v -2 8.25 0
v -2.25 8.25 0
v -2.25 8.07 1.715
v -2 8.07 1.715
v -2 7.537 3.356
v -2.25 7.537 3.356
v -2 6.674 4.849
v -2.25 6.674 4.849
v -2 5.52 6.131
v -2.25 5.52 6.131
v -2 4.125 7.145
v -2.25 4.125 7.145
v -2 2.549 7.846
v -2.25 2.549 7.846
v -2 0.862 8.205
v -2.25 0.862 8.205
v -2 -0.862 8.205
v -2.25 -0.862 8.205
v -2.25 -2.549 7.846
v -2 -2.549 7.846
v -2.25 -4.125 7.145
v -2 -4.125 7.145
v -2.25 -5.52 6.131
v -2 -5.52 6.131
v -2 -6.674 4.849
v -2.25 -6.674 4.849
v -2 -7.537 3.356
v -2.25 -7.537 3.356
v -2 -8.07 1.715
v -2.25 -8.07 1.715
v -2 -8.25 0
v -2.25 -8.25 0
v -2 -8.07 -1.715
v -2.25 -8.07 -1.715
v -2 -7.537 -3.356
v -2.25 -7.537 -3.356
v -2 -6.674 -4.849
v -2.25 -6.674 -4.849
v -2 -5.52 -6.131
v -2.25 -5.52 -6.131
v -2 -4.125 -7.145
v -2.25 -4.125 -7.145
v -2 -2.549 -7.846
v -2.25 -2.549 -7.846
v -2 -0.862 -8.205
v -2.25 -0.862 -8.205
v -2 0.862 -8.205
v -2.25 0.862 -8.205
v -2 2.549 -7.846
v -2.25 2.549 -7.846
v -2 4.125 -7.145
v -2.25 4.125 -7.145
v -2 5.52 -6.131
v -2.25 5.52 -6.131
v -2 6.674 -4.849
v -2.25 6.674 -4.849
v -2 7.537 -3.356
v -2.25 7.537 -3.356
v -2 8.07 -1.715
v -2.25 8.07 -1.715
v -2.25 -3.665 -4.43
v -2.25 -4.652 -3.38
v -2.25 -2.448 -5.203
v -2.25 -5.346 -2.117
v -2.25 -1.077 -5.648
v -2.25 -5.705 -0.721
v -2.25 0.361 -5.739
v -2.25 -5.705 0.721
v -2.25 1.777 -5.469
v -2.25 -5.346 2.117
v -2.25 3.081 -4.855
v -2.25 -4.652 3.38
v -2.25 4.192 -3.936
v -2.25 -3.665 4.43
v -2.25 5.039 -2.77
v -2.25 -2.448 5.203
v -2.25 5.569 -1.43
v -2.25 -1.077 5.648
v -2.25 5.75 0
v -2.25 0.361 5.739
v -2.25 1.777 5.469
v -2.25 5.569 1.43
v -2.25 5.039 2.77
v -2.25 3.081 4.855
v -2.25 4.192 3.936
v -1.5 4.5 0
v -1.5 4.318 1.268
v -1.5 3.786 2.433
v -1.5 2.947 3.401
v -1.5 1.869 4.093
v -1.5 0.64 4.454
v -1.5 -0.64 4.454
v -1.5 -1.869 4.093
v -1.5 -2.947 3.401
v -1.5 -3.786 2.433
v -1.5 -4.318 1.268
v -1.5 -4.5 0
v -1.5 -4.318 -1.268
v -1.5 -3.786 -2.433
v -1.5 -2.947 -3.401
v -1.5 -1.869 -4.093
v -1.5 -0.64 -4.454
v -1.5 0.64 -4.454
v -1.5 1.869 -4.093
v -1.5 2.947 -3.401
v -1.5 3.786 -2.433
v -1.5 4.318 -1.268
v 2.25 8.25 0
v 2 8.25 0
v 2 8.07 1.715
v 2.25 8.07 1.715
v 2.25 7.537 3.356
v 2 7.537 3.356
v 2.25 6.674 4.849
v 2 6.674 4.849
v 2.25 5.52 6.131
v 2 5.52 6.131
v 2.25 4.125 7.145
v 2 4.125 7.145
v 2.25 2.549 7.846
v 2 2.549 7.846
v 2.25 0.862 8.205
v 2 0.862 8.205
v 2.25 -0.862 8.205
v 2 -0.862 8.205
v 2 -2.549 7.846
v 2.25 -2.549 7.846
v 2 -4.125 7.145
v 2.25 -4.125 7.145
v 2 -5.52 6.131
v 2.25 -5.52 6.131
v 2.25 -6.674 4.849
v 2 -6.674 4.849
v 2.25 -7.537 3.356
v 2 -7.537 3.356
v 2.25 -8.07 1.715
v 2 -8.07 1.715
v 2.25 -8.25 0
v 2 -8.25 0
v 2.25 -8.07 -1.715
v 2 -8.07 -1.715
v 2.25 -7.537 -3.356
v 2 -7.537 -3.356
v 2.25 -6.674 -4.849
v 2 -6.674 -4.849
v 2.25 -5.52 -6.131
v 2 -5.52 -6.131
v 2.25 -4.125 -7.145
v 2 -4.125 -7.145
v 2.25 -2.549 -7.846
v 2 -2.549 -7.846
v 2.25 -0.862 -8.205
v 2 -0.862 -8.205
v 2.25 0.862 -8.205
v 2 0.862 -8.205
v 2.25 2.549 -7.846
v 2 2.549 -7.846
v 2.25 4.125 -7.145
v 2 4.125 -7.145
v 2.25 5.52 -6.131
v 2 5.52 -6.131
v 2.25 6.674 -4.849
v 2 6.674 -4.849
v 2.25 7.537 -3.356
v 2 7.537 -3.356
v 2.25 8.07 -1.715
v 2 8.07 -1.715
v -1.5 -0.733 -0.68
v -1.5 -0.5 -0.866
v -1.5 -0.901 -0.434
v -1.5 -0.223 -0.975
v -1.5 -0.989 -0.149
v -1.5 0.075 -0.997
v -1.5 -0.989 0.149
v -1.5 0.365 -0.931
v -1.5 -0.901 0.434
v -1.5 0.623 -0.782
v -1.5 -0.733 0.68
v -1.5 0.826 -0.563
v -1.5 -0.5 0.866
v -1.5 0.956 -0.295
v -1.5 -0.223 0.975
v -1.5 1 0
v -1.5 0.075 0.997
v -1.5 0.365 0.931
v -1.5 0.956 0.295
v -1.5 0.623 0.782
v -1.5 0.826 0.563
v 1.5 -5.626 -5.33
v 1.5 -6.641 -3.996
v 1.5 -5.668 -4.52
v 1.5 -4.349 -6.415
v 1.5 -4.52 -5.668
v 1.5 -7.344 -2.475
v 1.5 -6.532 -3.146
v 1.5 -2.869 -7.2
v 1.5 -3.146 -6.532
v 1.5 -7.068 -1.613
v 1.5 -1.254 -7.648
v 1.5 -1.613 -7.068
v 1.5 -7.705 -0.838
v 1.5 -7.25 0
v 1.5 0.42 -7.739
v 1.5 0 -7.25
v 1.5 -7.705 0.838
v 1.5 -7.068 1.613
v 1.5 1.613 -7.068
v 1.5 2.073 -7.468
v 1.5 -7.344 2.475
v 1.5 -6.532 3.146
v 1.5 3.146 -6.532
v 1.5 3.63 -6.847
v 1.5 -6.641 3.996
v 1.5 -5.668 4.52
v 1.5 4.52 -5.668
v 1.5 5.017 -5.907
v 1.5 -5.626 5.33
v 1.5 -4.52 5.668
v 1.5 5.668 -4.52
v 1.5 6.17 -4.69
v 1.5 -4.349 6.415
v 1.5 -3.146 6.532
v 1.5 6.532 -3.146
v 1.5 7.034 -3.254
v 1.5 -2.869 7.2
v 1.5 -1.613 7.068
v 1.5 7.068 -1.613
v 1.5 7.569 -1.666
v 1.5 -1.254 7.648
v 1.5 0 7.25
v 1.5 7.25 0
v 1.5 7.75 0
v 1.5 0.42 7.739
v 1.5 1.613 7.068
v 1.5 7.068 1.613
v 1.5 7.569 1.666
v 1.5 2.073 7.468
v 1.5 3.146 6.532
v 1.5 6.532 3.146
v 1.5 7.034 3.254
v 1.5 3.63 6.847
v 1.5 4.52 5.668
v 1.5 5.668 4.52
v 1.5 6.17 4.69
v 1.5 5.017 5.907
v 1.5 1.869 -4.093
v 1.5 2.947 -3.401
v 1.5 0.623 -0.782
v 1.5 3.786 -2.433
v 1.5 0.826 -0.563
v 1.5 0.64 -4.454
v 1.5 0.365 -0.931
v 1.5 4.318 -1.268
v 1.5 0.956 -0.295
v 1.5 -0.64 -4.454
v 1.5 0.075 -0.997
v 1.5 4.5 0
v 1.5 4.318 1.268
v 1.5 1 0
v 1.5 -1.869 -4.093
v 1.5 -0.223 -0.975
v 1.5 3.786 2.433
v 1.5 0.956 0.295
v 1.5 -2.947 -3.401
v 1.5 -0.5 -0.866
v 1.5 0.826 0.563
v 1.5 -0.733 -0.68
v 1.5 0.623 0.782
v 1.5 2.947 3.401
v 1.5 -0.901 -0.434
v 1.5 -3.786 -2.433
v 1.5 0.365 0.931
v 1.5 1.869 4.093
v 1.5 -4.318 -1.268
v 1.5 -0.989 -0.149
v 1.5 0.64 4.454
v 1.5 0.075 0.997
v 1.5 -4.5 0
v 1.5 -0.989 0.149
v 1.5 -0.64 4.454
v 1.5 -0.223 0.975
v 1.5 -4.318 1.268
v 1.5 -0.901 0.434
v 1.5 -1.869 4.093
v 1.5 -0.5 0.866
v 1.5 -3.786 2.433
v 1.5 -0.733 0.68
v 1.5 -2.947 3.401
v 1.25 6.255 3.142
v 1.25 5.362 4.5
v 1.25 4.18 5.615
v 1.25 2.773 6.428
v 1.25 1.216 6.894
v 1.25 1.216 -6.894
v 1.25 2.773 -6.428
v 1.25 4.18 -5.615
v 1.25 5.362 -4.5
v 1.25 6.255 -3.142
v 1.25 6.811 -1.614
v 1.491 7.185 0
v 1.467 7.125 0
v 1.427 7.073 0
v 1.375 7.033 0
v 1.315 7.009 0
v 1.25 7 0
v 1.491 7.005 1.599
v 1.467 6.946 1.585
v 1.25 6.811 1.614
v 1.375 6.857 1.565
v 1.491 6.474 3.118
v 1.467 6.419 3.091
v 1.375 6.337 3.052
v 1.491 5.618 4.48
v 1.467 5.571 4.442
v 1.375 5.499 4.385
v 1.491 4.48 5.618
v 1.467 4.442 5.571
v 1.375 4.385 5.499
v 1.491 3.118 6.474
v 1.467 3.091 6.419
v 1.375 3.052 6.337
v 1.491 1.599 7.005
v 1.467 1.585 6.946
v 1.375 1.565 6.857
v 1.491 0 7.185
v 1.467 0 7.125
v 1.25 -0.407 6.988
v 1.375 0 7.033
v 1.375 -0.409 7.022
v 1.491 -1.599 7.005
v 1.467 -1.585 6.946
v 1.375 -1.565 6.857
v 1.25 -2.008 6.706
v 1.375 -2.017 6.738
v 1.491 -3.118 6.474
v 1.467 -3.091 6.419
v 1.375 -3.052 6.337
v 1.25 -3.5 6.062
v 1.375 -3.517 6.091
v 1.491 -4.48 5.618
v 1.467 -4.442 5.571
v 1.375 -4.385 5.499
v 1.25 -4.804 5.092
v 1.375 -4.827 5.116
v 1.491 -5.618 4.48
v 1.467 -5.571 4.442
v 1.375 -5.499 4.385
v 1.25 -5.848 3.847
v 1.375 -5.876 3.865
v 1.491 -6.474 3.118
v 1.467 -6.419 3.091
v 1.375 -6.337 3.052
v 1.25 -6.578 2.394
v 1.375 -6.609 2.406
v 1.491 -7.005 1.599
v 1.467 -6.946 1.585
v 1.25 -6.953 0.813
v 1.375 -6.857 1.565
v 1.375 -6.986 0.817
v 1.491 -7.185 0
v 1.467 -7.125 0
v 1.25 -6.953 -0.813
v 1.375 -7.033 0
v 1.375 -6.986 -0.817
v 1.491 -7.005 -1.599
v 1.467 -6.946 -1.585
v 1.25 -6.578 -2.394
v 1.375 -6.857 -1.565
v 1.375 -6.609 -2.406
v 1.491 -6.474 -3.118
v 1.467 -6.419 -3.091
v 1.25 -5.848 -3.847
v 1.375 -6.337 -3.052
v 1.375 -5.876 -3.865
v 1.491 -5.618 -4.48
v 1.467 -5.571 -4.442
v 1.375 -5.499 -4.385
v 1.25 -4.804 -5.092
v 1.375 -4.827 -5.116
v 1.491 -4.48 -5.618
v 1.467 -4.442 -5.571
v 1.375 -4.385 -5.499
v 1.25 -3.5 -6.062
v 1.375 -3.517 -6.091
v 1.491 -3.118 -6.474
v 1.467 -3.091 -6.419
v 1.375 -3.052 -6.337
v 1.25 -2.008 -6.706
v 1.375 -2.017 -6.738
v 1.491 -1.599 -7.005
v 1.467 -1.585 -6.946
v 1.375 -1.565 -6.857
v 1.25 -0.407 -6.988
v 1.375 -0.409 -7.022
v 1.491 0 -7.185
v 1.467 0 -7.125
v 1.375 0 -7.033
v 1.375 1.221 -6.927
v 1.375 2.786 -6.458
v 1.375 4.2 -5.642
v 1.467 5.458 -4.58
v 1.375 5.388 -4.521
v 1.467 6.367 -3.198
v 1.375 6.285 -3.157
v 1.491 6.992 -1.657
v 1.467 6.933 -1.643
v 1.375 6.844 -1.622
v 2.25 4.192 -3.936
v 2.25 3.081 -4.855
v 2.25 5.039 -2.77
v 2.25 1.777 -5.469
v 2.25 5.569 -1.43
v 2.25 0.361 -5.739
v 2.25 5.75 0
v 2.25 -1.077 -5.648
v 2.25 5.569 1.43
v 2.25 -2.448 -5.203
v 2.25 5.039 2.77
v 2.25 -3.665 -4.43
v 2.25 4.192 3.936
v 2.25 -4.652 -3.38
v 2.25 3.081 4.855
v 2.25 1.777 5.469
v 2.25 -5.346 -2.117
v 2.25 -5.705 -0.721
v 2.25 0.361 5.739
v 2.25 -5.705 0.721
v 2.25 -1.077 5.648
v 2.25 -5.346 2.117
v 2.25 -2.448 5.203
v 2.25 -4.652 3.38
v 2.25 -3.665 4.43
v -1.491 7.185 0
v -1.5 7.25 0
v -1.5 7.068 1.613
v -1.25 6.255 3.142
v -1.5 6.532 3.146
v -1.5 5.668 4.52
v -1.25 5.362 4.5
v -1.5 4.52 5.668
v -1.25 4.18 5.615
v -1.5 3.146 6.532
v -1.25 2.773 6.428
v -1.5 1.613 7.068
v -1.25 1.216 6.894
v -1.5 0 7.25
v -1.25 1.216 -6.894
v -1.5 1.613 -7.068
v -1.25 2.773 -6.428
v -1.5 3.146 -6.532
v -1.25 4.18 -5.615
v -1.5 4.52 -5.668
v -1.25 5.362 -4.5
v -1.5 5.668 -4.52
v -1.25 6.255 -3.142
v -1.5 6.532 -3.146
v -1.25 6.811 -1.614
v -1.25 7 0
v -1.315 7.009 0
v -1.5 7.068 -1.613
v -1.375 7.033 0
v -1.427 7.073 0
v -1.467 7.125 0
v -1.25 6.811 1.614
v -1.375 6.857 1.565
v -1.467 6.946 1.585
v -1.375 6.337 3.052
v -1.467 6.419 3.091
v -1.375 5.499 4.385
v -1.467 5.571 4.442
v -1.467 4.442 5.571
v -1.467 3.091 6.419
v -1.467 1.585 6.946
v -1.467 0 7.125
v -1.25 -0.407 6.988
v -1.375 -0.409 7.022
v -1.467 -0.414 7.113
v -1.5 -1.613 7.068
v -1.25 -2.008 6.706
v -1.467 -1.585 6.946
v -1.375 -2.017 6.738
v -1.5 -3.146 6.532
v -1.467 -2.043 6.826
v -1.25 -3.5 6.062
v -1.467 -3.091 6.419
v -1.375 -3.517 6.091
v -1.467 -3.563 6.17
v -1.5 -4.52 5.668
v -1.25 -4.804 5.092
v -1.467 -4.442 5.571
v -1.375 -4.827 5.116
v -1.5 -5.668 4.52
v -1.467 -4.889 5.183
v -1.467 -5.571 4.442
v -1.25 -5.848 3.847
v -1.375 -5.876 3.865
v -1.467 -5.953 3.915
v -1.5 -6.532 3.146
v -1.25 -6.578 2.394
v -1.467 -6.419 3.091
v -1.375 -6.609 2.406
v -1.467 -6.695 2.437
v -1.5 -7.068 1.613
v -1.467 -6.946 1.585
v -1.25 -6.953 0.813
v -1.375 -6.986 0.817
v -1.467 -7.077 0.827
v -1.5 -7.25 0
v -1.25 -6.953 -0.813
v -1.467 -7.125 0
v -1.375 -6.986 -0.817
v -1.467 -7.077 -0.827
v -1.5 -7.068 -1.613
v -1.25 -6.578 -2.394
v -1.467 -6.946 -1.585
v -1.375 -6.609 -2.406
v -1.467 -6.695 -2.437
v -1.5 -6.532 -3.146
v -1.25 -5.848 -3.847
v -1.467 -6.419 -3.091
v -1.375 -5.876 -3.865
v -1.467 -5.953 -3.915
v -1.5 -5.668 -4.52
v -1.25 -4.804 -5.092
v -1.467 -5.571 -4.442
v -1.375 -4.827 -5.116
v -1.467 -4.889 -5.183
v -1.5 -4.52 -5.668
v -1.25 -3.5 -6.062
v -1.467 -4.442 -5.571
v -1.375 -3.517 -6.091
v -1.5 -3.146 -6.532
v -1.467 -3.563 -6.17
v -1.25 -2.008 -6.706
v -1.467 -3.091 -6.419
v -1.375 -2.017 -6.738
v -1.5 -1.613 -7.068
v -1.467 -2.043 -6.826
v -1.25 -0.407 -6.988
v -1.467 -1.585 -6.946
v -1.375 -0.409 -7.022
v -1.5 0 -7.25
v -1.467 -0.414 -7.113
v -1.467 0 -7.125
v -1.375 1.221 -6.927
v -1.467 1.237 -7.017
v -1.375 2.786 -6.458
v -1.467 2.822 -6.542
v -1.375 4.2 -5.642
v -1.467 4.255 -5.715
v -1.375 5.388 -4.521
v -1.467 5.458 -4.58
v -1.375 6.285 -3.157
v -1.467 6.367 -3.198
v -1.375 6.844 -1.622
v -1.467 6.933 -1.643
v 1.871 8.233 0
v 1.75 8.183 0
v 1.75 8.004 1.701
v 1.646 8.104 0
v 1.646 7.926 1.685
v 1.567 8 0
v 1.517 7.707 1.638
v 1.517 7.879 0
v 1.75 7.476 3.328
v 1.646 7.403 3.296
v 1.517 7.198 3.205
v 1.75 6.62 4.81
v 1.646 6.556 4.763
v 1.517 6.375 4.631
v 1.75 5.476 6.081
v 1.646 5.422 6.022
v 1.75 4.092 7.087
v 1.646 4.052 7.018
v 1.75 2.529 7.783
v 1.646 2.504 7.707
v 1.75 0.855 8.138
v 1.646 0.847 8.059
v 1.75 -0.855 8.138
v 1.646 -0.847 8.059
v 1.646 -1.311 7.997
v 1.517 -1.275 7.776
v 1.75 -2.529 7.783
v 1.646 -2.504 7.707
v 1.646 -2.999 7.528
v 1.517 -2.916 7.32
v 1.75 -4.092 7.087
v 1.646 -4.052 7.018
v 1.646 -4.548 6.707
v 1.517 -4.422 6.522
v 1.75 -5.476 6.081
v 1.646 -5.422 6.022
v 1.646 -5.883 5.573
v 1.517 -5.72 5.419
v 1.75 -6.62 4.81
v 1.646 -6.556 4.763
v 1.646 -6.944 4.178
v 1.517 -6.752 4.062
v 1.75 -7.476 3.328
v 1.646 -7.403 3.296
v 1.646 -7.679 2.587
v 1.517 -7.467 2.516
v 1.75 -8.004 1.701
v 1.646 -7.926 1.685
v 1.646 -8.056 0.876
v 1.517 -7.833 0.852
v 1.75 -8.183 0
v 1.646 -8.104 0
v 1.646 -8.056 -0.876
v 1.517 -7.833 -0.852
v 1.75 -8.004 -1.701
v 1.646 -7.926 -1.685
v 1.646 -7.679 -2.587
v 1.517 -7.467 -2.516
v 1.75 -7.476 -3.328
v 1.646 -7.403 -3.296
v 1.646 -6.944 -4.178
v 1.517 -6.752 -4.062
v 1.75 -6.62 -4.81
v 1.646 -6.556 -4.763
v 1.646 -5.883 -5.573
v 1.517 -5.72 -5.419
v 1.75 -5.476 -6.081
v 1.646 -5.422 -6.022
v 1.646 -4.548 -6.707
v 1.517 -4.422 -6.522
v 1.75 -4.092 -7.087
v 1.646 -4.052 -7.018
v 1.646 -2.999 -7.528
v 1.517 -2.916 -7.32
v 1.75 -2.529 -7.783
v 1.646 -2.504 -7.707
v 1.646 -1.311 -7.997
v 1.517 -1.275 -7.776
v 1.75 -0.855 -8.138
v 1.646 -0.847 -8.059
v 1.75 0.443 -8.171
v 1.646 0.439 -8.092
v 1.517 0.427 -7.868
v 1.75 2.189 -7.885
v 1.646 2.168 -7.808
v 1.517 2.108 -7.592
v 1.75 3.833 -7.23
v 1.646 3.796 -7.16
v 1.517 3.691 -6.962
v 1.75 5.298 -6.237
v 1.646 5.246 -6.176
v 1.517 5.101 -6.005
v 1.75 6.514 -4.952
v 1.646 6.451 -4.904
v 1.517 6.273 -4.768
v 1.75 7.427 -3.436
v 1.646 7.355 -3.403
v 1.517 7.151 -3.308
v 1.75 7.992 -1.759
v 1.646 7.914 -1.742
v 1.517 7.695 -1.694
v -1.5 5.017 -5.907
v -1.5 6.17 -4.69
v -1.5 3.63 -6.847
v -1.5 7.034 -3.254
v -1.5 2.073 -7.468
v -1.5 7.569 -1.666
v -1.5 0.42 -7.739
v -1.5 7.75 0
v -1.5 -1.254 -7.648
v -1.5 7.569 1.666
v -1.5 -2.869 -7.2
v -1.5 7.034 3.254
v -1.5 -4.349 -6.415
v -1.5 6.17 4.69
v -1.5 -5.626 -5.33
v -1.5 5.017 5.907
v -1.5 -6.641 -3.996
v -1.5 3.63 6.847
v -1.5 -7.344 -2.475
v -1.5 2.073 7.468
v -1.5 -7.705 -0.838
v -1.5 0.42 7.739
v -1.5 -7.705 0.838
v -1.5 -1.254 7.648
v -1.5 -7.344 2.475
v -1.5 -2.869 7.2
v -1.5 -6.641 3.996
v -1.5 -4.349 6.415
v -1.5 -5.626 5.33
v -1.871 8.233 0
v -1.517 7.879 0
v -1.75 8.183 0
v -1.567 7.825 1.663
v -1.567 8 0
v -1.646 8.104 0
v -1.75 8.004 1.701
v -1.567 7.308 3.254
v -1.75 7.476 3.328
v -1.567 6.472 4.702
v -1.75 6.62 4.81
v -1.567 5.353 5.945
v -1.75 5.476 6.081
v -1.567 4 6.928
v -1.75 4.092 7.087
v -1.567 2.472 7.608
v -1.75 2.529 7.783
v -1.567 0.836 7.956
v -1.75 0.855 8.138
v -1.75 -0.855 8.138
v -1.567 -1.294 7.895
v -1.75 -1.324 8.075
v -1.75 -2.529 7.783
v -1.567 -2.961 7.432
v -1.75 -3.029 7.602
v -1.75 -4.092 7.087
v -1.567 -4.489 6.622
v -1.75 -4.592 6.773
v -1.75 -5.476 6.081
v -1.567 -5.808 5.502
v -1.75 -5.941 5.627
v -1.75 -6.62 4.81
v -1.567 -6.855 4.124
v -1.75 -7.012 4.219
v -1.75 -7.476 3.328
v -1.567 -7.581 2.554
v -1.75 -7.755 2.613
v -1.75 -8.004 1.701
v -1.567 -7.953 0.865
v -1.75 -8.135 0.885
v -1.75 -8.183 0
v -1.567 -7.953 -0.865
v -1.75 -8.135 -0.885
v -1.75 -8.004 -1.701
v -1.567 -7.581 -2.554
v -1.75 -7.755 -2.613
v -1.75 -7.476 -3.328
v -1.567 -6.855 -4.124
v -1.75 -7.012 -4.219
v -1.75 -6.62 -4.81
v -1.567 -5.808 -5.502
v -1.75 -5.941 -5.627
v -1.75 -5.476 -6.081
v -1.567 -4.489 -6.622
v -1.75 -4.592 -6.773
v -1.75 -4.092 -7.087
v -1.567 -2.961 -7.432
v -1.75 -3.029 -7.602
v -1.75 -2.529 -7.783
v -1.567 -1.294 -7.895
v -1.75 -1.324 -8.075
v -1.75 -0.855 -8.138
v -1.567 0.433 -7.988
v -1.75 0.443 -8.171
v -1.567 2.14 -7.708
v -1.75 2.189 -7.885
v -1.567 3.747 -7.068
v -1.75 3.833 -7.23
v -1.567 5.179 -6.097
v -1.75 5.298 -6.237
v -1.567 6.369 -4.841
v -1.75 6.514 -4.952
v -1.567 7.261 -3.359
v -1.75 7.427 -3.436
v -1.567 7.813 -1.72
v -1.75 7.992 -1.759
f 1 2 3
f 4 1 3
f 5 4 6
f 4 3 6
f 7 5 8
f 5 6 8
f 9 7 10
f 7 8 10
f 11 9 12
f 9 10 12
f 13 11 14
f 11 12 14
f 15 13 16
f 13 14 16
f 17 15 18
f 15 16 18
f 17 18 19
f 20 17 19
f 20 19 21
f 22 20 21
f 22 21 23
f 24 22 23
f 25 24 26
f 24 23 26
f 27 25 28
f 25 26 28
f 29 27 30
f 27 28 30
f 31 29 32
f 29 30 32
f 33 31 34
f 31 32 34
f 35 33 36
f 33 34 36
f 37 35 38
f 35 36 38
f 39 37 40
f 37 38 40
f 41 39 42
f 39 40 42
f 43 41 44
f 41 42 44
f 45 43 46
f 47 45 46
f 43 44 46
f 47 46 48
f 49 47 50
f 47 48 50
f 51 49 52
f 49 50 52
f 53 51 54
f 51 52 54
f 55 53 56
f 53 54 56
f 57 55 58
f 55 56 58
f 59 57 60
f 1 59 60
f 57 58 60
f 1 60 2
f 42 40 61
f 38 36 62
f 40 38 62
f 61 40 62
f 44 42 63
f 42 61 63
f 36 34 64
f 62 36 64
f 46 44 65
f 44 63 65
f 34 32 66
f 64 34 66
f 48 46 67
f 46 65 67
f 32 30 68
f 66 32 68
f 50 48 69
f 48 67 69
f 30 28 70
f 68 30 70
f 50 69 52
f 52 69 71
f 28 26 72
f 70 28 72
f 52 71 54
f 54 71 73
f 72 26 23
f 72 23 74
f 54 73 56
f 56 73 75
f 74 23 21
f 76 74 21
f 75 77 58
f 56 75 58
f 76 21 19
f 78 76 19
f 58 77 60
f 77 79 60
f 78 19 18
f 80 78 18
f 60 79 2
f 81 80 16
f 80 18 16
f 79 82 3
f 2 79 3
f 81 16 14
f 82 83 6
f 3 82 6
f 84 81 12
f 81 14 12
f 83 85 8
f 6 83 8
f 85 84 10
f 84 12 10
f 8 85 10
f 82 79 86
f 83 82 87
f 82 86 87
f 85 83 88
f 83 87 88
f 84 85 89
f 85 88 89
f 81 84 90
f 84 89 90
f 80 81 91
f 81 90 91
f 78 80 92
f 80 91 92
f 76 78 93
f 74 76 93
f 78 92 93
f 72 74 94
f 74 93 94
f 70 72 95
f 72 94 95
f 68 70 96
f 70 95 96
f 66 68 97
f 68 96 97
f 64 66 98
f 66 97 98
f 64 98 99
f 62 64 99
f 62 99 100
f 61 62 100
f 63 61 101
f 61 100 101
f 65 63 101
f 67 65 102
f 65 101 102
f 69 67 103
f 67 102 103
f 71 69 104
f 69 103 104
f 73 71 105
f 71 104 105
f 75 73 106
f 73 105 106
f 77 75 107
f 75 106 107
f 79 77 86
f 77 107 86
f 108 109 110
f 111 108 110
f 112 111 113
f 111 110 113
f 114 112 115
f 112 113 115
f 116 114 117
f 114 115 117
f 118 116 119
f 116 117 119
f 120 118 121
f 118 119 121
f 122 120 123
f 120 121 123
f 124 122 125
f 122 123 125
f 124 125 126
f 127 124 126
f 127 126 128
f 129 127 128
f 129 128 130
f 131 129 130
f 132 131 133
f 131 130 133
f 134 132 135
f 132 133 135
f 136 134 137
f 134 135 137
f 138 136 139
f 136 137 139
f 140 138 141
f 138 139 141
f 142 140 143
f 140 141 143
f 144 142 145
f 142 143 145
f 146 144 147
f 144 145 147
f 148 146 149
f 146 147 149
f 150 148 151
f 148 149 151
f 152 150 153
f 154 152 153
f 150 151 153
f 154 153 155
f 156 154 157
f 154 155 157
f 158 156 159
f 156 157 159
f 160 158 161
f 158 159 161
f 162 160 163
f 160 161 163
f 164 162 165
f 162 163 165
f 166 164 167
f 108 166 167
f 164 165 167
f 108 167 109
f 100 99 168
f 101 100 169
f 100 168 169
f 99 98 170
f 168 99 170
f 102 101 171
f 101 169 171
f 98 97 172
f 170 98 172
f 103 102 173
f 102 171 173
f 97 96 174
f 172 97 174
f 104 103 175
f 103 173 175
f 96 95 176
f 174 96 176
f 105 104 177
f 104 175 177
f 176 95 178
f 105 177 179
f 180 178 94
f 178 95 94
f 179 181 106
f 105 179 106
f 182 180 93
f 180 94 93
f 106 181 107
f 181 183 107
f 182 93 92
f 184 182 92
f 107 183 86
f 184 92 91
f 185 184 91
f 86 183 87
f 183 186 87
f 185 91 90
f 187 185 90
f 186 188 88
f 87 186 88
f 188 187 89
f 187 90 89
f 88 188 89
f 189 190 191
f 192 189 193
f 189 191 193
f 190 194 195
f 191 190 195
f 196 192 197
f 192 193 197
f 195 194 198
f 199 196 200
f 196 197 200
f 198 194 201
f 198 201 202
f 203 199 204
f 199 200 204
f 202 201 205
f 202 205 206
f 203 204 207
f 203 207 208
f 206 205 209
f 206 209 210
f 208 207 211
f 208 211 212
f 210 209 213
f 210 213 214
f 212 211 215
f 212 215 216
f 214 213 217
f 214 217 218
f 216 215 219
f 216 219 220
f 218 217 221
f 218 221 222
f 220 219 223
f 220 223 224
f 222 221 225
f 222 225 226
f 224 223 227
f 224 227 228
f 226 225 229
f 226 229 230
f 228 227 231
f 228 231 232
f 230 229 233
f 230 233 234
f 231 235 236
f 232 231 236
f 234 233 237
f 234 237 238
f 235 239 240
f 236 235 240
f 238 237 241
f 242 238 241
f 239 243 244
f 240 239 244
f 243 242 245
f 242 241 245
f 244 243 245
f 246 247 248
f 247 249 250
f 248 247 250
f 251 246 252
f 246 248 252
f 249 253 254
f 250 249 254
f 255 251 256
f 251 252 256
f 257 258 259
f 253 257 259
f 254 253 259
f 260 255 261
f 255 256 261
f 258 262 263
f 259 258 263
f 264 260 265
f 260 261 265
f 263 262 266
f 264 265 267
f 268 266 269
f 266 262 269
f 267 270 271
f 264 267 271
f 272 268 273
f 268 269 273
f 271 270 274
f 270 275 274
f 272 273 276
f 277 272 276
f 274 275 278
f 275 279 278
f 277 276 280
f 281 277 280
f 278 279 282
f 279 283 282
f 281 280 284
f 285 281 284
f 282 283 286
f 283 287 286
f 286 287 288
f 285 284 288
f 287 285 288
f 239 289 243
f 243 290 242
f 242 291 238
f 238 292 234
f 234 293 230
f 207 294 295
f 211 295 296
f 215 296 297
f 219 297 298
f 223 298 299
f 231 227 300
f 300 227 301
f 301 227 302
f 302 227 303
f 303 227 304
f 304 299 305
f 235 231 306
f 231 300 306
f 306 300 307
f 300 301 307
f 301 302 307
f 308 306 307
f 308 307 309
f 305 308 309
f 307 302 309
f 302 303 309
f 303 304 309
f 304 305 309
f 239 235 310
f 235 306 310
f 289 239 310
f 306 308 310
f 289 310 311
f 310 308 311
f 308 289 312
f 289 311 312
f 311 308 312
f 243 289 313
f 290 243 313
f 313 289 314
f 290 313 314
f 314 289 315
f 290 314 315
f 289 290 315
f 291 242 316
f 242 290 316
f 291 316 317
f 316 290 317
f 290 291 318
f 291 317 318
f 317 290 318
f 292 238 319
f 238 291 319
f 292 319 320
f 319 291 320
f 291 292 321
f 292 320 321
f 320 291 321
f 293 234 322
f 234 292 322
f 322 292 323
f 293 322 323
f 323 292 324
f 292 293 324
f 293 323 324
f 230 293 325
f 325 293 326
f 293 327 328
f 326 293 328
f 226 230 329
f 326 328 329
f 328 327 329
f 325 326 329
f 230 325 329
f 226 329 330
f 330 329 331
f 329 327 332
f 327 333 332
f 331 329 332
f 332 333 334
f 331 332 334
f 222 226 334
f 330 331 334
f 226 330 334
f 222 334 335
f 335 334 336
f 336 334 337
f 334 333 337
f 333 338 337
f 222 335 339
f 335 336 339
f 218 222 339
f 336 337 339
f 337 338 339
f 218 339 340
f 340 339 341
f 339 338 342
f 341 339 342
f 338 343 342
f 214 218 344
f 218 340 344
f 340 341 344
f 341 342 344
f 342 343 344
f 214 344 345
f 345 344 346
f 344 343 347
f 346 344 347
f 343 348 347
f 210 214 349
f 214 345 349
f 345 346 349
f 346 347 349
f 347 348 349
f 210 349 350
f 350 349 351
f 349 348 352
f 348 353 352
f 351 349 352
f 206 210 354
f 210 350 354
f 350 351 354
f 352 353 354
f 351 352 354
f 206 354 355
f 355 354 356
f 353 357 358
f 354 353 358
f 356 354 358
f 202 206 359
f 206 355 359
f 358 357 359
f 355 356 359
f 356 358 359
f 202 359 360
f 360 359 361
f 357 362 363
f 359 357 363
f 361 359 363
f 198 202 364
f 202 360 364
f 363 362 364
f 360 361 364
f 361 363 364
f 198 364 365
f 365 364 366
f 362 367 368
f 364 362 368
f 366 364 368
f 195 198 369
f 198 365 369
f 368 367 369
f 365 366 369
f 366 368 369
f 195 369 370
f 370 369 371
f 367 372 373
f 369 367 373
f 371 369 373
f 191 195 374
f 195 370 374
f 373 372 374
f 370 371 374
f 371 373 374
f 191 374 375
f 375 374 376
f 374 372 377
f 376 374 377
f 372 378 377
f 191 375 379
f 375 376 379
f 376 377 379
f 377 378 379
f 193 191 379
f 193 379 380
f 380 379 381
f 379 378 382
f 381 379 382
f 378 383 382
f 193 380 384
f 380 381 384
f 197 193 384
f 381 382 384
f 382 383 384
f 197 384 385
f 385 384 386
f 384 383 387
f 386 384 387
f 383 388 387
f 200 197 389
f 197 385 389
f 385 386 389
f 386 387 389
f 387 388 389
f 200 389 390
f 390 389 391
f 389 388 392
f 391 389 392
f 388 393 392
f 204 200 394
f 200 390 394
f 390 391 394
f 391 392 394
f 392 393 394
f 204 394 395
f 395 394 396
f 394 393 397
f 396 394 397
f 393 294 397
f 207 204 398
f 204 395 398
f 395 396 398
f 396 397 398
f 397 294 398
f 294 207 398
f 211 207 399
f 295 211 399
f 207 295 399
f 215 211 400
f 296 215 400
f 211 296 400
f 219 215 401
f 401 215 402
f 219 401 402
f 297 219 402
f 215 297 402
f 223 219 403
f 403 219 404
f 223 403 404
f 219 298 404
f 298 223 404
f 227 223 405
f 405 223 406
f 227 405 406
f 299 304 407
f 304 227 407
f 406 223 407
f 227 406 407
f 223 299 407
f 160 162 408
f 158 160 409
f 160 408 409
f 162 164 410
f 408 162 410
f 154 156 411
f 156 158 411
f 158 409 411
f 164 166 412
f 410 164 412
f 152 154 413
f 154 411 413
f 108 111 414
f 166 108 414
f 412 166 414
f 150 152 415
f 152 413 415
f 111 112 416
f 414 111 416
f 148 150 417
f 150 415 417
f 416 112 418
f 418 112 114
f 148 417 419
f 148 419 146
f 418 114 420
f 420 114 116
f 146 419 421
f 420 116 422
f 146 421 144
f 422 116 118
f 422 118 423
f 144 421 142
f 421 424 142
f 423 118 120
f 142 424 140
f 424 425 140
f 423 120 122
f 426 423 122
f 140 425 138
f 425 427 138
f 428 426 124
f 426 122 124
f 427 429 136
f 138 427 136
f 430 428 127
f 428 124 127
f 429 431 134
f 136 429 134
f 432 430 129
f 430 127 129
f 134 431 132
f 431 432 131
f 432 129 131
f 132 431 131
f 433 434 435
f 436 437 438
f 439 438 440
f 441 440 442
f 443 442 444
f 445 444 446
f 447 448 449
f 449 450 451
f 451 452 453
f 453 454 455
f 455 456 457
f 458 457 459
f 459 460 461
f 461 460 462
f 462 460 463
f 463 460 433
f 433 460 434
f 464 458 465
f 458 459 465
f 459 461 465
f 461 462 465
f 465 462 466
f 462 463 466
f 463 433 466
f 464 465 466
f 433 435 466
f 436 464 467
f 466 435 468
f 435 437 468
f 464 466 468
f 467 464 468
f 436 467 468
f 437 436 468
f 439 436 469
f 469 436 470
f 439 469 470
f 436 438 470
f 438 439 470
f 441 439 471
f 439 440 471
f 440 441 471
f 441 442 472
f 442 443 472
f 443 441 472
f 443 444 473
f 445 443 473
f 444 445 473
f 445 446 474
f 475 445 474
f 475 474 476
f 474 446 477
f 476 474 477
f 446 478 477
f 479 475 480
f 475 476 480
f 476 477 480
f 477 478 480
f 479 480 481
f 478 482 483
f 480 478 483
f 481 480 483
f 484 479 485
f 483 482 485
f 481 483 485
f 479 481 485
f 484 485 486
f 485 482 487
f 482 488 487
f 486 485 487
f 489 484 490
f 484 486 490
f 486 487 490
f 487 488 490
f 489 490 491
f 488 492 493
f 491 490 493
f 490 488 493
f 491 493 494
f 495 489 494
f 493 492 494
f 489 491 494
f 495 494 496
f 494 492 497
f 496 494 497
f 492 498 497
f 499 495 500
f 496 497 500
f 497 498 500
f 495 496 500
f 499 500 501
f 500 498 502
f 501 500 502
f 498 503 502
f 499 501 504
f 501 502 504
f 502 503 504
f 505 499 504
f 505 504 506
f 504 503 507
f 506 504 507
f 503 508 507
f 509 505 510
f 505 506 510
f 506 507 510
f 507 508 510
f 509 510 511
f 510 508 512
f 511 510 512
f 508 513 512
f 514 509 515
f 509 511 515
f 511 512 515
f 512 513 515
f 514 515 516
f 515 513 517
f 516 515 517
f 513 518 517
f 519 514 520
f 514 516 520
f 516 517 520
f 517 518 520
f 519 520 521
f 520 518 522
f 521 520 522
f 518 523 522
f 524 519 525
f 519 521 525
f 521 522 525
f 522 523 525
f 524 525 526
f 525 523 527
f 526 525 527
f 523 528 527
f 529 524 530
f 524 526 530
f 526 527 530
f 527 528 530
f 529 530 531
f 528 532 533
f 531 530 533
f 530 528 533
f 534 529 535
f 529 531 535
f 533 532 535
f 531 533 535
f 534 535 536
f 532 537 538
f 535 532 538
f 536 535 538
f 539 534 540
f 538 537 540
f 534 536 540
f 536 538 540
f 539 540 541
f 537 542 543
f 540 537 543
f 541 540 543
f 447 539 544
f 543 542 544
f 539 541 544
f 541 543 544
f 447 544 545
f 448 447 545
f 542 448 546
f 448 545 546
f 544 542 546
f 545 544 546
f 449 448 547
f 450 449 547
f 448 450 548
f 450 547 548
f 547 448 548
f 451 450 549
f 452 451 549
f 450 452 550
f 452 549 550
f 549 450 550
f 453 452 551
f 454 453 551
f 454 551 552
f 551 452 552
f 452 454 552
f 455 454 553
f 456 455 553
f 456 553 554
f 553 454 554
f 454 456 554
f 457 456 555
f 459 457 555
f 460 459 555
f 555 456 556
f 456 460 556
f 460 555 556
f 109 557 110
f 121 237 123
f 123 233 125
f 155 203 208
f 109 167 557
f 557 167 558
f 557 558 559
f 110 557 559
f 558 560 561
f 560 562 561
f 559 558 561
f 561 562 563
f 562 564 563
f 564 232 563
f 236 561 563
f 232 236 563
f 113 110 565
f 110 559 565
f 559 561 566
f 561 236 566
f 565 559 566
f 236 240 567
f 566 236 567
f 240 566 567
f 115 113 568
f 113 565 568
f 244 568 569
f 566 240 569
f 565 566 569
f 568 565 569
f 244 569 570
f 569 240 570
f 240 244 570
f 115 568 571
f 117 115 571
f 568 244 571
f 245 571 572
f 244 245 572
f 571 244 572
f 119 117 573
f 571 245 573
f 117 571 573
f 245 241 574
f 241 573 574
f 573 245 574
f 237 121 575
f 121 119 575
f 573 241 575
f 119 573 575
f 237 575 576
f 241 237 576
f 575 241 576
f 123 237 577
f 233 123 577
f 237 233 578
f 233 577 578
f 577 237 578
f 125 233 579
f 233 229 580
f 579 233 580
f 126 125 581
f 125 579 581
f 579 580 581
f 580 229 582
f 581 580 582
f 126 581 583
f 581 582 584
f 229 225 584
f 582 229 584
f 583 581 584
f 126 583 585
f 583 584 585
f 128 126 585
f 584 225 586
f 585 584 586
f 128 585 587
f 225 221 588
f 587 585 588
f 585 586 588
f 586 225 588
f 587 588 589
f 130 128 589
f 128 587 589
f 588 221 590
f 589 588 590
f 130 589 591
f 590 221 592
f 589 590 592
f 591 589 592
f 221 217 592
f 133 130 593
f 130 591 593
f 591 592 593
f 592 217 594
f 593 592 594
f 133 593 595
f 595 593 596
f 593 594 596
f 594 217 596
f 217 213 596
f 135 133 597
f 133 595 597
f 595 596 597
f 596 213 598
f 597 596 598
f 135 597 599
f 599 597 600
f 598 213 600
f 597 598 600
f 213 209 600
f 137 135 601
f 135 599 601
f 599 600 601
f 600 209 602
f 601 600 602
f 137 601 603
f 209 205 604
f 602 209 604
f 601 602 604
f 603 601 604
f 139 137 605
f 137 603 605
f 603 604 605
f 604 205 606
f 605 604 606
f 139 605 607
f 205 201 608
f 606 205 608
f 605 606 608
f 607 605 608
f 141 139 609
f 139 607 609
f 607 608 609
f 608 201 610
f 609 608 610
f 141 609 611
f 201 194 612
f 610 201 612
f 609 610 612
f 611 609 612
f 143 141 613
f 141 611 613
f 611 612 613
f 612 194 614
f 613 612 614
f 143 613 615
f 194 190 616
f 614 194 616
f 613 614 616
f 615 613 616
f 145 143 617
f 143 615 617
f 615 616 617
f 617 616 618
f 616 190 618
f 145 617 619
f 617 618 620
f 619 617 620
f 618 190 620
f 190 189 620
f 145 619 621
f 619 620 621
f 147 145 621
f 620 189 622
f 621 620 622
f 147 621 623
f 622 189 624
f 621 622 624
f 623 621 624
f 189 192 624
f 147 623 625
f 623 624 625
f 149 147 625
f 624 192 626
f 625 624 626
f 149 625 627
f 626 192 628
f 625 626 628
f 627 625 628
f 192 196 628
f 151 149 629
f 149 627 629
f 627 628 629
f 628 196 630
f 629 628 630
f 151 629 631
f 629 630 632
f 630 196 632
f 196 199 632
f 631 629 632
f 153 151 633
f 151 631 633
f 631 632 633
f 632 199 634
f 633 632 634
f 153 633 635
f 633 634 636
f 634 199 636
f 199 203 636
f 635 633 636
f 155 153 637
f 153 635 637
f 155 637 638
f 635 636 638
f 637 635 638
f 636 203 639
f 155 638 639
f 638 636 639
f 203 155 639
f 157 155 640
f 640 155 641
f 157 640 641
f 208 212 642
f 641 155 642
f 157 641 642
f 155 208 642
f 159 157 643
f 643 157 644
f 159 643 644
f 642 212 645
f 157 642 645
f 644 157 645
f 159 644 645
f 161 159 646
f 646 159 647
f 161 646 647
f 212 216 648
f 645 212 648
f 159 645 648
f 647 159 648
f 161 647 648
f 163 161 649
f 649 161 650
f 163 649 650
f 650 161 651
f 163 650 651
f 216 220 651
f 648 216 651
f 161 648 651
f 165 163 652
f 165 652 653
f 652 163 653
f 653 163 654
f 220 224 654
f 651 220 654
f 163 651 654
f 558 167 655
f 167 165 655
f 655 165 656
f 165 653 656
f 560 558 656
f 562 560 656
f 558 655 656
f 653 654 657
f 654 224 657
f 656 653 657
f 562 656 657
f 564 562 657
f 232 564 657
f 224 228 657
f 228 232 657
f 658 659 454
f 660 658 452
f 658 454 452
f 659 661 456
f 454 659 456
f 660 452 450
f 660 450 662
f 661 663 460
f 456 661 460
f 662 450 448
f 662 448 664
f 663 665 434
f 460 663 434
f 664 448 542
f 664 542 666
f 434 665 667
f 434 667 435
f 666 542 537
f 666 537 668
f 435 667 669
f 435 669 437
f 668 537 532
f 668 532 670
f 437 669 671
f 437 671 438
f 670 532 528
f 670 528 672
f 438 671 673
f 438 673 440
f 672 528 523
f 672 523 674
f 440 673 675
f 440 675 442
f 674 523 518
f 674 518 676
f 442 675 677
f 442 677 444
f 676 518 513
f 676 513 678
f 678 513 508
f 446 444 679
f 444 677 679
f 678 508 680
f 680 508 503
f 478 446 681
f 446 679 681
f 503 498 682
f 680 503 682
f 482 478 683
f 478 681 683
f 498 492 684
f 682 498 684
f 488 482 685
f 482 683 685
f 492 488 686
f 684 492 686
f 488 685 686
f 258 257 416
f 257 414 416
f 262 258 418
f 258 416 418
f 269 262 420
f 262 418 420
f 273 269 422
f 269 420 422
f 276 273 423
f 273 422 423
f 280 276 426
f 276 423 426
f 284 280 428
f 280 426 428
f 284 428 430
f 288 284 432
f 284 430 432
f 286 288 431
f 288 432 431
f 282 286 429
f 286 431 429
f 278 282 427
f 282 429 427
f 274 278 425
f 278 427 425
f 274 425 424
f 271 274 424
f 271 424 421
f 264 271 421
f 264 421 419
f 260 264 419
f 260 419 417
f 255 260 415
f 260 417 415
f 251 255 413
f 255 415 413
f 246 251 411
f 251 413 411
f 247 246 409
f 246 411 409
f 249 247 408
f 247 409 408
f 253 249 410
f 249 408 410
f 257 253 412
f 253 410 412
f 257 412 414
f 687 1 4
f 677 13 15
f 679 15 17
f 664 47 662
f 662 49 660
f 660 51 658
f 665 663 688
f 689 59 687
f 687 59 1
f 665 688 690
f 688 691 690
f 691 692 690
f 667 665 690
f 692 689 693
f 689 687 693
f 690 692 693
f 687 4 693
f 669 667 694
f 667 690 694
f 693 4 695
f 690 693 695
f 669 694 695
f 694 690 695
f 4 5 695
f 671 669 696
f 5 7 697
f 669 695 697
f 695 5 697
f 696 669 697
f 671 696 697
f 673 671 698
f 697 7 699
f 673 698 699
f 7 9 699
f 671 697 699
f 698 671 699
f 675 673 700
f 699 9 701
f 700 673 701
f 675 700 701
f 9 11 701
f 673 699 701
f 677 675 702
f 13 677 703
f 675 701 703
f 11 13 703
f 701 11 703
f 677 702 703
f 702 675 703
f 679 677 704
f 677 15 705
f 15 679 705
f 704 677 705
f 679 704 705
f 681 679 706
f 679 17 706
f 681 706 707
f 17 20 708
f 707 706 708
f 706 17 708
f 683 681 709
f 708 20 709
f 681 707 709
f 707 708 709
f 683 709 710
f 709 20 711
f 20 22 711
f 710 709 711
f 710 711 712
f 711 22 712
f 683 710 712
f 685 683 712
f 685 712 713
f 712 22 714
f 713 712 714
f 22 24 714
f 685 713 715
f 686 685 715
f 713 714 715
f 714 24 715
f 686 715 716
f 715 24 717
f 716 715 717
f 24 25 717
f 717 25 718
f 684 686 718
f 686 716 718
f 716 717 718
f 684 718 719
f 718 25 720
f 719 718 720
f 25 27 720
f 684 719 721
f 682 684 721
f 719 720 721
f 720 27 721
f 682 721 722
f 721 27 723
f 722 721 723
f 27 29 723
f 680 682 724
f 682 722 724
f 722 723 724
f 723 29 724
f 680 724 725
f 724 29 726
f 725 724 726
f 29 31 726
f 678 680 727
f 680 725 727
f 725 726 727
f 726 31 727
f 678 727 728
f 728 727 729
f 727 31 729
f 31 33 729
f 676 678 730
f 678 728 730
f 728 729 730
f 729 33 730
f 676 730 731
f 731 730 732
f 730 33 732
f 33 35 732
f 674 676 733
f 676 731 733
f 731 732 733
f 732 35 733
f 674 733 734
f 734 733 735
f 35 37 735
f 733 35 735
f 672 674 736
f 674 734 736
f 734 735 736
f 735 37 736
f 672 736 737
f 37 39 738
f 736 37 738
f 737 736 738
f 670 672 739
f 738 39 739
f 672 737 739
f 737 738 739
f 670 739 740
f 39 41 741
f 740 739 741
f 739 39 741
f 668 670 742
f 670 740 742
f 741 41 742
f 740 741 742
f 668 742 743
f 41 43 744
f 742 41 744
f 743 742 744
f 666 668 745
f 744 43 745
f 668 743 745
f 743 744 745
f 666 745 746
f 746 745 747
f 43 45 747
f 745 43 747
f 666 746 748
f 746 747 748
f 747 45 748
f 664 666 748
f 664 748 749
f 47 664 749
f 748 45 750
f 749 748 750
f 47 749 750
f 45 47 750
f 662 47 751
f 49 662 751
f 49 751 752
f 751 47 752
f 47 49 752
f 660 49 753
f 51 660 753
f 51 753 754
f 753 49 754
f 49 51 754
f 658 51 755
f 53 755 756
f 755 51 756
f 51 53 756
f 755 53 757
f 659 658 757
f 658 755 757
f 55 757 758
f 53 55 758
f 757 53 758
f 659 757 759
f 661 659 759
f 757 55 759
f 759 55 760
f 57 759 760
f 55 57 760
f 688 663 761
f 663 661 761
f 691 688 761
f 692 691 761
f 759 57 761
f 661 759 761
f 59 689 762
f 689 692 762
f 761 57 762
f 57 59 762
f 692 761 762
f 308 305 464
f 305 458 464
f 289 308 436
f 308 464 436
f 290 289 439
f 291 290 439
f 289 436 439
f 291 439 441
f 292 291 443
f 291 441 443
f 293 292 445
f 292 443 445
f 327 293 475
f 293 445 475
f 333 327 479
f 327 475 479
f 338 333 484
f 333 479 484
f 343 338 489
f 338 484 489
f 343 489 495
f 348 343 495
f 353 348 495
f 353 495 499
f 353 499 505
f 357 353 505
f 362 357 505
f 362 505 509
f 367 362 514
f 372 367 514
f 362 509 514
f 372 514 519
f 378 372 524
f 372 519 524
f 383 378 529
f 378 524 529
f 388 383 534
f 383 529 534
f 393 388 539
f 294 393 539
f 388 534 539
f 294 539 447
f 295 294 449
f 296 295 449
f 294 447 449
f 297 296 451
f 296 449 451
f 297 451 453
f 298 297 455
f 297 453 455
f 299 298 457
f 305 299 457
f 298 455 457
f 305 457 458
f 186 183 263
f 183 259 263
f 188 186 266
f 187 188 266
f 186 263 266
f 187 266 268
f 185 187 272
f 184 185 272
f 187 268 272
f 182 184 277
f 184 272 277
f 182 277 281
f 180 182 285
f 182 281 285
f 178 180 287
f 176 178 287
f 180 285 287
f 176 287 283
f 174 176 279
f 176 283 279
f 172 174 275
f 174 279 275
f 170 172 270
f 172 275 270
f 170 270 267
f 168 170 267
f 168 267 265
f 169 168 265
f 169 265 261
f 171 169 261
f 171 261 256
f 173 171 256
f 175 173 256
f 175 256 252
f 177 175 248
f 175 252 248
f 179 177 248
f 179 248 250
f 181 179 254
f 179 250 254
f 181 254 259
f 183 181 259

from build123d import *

# Parameters (mm, degrees)
FILLET1_R = 0.5


with BuildPart() as part:
    # Sketch1 → Revolve1 (revolve)
    with BuildSketch(Plane.XY):
        with BuildLine():
            Line((-1.5, 1), (1.5, 1))
            Line((1.5, 1), (1.5, 4.5))
            Line((1.5, 4.5), (2.25, 5.75))
            Line((2.25, 5.75), (2.25, 8.25))
            Line((2.25, 8.25), (1.5, 8.25))
            Line((1.5, 8.25), (1.5, 7.25))
            ThreePointArc((1.5, 7.25), (1.426776695, 7.073223305), (1.25, 7))
            Line((1.25, 7), (-1.25, 7))
            ThreePointArc((-1.25, 7), (-1.426776695, 7.073223305), (-1.5, 7.25))
            Line((-1.5, 7.25), (-1.5, 8.25))
            Line((-1.5, 8.25), (-2.25, 8.25))
            Line((-2.25, 8.25), (-2.25, 5.75))
            Line((-2.25, 5.75), (-1.5, 4.5))
            Line((-1.5, 4.5), (-1.5, 1))
        make_face()
    revolve(axis=Axis((0, 0, 0), (1, 0, 0)))

    # Fillet1
    fillet1_edges = [part.edges().sort_by_distance(p)[0] for p in [
        (-1.5, -8.25, 0),
        (1.5, -8.25, 0),
    ]]
    fillet(fillet1_edges, radius=FILLET1_R)


solid = part.part
